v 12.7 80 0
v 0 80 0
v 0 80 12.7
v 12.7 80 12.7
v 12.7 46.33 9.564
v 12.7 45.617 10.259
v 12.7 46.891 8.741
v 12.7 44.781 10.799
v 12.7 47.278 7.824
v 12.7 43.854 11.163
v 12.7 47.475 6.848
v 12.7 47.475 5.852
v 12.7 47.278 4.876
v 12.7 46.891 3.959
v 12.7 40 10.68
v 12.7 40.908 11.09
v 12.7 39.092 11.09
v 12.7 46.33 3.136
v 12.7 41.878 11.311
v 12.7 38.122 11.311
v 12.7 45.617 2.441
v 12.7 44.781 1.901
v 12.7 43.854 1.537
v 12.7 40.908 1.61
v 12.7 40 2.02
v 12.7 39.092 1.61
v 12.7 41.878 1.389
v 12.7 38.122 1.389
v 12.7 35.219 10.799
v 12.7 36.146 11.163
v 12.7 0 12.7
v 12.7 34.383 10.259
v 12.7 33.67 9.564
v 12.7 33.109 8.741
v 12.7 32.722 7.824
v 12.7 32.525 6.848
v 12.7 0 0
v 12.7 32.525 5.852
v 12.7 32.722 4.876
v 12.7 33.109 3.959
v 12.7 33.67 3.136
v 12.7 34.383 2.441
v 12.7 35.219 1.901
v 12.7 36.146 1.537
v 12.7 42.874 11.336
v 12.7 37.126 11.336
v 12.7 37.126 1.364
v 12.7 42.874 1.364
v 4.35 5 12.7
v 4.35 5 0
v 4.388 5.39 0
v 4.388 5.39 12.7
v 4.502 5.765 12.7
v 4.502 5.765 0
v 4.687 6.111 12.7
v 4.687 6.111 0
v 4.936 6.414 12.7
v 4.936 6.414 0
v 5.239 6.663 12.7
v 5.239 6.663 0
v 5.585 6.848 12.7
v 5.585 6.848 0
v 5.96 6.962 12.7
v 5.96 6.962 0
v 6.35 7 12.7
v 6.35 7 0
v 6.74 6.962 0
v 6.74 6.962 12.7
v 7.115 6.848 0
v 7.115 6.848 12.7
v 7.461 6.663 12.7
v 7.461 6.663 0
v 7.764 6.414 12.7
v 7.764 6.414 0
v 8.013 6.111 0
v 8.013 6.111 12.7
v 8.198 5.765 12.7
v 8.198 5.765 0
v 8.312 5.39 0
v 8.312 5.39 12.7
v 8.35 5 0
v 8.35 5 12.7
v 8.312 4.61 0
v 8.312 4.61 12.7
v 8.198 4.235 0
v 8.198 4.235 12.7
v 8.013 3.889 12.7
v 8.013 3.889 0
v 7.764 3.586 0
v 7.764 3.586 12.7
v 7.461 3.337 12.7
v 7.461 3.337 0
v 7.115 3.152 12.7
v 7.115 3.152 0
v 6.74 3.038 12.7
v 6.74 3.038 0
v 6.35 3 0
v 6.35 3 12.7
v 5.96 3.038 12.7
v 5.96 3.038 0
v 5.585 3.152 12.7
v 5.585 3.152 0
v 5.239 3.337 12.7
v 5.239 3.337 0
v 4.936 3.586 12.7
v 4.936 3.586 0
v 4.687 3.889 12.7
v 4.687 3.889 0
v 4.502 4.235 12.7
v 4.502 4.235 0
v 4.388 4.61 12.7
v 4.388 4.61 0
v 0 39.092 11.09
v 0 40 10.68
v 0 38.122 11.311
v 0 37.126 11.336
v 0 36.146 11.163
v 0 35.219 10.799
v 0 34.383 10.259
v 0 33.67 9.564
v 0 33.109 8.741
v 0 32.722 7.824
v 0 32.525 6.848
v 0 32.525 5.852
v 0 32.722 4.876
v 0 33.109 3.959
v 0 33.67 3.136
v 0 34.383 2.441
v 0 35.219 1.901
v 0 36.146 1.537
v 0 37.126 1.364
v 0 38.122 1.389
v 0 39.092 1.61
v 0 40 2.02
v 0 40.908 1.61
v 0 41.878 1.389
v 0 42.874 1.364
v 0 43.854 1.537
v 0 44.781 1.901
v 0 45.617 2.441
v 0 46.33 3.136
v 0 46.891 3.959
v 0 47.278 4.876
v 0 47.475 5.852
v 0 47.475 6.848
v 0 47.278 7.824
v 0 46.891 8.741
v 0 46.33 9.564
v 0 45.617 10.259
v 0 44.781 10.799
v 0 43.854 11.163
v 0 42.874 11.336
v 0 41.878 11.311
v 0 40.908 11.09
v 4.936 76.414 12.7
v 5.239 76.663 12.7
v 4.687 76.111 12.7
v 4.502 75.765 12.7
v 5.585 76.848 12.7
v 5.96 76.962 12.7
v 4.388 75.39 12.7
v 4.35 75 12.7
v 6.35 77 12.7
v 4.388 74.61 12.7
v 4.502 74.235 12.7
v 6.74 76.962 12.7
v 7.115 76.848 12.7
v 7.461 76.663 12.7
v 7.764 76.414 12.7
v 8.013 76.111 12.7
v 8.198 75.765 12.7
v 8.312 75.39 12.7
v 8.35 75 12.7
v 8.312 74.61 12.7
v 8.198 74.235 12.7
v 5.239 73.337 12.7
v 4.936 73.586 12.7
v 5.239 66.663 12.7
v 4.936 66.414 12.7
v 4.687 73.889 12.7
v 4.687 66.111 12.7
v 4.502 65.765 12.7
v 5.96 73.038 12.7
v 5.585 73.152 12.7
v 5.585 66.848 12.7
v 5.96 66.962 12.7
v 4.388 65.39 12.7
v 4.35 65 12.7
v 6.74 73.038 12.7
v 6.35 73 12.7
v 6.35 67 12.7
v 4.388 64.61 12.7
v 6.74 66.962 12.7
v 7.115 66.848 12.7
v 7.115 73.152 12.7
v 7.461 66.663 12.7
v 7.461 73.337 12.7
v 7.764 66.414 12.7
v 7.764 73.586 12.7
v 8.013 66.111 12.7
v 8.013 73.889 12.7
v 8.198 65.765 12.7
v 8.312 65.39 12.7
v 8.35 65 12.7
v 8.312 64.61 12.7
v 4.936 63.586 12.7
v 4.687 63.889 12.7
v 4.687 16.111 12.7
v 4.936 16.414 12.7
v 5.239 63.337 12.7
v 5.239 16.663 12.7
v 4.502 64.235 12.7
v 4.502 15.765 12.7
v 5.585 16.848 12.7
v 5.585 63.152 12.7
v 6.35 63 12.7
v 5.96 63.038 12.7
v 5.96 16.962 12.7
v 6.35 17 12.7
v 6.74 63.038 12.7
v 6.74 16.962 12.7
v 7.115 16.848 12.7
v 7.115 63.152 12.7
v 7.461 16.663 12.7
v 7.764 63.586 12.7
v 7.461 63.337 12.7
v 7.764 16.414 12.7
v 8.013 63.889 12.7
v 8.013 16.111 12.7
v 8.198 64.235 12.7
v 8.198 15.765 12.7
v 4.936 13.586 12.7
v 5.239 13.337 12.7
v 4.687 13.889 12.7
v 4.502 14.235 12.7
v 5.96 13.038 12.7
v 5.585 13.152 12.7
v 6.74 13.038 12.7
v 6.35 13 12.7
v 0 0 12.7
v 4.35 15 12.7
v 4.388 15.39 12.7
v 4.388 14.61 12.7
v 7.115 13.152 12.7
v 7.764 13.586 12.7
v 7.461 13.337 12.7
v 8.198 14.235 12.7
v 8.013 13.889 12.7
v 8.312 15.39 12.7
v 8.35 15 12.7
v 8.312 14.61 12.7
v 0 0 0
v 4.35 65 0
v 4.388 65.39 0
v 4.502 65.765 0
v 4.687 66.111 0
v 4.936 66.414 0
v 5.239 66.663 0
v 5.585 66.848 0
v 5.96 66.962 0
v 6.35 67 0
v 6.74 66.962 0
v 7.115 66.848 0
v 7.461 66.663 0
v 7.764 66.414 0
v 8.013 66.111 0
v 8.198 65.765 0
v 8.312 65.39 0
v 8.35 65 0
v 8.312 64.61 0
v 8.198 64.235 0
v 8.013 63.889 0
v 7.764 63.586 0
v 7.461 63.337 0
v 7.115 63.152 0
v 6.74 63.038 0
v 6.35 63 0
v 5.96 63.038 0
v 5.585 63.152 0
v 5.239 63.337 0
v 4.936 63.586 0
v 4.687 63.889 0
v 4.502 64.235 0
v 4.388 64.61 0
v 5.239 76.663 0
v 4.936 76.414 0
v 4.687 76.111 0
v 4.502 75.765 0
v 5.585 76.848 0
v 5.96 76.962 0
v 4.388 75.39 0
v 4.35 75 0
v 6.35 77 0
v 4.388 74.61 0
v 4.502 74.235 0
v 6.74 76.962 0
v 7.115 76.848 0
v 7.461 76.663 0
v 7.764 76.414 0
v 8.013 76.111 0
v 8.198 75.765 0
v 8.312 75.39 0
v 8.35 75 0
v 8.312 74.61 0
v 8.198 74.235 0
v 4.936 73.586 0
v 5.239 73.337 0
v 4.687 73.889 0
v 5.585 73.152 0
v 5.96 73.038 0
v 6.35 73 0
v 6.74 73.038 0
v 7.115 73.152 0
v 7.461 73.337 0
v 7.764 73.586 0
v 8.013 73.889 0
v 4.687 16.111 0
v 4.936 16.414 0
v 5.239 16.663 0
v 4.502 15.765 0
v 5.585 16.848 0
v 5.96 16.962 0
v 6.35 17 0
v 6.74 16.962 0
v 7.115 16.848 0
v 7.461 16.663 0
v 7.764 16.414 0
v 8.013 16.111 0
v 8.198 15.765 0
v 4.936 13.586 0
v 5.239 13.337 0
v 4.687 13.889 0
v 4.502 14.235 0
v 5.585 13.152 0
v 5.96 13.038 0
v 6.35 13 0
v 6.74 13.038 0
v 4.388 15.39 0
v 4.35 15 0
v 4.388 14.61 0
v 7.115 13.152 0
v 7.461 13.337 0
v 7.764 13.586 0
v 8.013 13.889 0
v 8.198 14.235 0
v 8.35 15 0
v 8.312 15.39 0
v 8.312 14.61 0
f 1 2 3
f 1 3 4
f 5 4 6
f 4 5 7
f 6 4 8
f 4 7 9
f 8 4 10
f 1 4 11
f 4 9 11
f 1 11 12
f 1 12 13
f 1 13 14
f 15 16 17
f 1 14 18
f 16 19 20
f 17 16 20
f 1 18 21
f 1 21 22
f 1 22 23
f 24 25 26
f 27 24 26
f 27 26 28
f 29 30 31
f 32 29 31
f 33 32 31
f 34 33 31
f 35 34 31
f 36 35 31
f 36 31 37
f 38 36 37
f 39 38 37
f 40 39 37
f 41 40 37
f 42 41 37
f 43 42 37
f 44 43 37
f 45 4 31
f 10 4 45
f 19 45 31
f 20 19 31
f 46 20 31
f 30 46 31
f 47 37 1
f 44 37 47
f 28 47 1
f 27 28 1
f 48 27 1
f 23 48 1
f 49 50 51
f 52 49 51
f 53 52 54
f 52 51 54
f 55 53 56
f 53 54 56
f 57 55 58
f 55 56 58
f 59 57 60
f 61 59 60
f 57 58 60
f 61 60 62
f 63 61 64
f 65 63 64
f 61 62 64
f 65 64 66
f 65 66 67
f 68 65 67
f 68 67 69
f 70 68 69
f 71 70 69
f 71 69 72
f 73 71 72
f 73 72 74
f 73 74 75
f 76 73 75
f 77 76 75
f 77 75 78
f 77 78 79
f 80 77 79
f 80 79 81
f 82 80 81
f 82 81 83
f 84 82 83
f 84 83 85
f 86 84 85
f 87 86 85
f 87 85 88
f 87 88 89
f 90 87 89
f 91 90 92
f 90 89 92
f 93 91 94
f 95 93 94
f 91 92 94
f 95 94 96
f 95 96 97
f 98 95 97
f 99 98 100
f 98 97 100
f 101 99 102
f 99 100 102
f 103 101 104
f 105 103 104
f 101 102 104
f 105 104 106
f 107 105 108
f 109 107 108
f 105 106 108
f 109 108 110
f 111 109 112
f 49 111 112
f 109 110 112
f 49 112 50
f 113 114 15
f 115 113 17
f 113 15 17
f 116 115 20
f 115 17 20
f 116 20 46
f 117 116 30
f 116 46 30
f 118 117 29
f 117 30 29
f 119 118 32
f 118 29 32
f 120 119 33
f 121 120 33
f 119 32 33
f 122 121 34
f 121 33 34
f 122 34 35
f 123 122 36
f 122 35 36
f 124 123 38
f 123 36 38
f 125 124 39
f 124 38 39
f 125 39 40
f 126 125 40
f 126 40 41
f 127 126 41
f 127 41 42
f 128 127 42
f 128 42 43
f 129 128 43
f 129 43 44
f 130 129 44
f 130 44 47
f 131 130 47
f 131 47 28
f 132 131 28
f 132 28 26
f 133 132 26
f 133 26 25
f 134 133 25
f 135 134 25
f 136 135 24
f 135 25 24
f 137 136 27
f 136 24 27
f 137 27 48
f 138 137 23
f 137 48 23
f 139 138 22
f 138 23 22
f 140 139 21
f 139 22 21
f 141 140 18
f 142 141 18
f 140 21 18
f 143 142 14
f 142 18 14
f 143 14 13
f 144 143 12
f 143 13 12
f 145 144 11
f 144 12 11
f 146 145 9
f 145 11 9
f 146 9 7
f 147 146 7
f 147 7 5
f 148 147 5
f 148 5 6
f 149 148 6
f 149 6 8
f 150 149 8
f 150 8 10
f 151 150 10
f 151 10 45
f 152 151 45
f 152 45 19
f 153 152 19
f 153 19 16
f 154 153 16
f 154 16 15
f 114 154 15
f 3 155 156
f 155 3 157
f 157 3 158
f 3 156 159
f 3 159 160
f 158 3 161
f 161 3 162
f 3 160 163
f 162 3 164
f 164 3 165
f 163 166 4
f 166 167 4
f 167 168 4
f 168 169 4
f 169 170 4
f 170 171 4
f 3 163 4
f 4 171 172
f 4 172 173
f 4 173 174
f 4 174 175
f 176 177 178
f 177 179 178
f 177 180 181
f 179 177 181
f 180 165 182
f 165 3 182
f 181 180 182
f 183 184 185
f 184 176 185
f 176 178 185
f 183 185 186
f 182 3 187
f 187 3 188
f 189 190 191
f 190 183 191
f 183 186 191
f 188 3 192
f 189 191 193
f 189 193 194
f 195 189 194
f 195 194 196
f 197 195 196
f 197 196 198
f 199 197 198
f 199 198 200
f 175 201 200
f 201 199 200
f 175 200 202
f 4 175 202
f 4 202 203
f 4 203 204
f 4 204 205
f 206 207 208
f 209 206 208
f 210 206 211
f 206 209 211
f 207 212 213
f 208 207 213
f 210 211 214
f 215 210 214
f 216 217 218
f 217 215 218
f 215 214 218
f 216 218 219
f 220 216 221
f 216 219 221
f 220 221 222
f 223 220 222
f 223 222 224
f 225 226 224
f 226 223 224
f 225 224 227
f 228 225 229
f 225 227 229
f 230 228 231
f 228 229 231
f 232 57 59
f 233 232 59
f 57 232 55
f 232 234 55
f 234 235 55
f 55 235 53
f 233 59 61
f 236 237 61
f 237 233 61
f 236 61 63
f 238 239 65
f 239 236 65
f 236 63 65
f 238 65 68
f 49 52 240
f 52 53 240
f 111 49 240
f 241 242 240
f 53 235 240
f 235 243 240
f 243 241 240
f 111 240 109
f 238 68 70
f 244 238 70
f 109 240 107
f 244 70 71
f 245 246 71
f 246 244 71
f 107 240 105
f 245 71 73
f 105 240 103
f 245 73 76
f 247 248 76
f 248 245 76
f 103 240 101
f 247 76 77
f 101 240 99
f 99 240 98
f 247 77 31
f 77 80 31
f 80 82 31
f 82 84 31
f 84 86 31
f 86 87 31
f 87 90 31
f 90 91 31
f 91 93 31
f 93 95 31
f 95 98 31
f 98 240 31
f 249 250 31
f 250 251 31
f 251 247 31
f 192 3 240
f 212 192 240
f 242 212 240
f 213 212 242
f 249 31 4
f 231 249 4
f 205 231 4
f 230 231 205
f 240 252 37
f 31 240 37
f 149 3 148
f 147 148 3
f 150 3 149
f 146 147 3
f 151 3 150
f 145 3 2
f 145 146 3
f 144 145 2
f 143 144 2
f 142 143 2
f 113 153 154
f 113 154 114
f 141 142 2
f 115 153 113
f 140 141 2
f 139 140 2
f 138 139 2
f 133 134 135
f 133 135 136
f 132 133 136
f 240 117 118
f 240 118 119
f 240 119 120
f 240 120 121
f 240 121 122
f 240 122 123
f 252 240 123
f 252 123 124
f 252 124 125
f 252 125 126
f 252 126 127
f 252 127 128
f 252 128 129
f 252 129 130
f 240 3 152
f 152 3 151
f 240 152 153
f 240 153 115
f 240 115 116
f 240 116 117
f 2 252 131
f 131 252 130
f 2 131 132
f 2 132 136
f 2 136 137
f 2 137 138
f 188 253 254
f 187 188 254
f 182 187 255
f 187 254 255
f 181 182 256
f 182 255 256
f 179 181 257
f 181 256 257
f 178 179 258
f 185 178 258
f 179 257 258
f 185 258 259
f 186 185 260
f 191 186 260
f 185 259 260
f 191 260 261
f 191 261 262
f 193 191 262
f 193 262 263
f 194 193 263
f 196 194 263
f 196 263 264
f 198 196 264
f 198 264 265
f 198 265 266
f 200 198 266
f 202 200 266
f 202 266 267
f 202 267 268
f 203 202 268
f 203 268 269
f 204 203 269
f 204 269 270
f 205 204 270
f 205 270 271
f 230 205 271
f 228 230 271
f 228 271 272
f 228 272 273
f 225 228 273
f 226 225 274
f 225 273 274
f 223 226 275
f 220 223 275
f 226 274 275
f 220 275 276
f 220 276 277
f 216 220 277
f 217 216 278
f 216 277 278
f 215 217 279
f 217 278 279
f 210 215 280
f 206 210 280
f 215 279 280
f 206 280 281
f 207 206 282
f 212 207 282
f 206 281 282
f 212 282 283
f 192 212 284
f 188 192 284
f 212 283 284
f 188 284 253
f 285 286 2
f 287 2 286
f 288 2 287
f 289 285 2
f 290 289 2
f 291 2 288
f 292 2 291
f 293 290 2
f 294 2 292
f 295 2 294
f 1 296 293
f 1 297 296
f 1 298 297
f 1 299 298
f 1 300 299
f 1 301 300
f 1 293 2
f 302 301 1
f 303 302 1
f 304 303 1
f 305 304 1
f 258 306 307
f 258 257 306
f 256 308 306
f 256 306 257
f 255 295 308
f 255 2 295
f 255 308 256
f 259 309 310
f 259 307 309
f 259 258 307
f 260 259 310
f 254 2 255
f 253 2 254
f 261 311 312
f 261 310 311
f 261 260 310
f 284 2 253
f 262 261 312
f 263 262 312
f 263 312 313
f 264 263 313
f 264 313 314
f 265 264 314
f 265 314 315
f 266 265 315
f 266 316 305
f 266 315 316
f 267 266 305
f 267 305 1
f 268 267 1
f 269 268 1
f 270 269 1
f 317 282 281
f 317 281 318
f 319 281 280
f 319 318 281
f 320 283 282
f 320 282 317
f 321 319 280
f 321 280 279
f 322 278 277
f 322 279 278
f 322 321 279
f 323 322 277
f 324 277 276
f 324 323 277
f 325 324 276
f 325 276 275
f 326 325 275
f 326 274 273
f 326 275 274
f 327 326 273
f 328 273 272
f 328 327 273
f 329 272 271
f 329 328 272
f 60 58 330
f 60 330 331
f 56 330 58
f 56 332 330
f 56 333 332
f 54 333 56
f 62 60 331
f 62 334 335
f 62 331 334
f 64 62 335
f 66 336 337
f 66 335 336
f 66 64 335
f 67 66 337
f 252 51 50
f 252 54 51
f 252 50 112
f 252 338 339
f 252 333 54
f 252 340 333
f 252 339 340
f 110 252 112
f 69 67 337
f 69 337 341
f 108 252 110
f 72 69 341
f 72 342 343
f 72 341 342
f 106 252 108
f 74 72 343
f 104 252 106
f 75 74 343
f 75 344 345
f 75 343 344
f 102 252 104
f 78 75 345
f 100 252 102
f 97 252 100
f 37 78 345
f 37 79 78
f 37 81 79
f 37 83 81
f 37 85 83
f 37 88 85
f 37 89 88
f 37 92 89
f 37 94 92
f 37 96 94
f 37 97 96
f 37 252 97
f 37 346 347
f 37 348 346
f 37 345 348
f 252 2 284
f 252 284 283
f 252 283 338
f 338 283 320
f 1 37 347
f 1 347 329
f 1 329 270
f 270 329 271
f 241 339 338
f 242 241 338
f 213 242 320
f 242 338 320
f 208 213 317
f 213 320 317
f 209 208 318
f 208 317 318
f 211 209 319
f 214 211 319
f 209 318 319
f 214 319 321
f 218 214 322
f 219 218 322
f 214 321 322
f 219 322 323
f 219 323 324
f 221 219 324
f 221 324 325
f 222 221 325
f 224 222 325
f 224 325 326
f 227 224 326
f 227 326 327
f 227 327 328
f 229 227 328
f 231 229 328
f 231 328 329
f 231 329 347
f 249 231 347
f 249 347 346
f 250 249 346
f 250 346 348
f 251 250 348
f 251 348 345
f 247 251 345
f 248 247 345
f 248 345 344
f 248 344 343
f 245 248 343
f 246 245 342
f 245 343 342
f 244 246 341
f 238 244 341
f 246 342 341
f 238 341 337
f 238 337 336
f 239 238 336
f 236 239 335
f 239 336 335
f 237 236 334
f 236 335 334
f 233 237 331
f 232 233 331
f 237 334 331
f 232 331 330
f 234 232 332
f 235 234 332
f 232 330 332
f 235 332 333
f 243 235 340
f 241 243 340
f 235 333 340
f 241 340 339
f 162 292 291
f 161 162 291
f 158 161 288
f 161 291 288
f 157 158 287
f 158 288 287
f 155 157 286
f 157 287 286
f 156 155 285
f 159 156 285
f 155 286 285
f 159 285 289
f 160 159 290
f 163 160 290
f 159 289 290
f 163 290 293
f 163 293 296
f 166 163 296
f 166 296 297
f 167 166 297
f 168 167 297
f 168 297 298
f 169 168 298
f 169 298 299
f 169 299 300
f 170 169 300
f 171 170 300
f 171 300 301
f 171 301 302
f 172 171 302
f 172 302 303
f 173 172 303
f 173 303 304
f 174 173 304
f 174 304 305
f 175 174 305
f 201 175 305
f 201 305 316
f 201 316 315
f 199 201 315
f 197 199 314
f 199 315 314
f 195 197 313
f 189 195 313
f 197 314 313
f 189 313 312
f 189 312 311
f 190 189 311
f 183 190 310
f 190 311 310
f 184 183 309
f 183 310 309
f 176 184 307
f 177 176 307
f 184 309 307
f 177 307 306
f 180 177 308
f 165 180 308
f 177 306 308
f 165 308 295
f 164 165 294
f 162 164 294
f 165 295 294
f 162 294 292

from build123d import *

# Parameters (mm, degrees)
SKETCH1_W           = 12.7
SKETCH1_H           = 12.7
BOSS_EXTRUDE1_DEPTH = 80
CUT_EXTRUDE1_DEPTH  = 80
SKETCH3_R           = 2
CUT_EXTRUDE2_DEPTH  = 80


with BuildPart() as part:
    # Sketch1 → Boss-Extrude1 (new body)
    with BuildSketch(Plane(origin=(0, 0, 0), x_dir=(1, 0, 0), z_dir=(0, 1, 0))):
        with Locations((6.35, -6.35)):
            Rectangle(SKETCH1_W, SKETCH1_H)
    extrude(amount=BOSS_EXTRUDE1_DEPTH)

    # Sketch2 → Cut-Extrude1 (cut)
    with BuildSketch(Plane(origin=(12.7, 0, 0), x_dir=(0, 0, -1), z_dir=(1, 0, 0))):
        with BuildLine():
            ThreePointArc((-10.680127019, 40), (-6.35, 32.5), (-2.019872981, 40))
            ThreePointArc((-2.019872981, 40), (-6.35, 47.5), (-10.680127019, 40))
        make_face()
    extrude(amount=-CUT_EXTRUDE1_DEPTH, mode=Mode.SUBTRACT)

    # Sketch3 → Cut-Extrude2 (cut)
    with BuildSketch(Plane(origin=(0, 0, 0), x_dir=(-1, 0, 0), z_dir=(0, 0, -1))):
        with Locations((-6.35, 5)):
            Circle(SKETCH3_R)
        with Locations((-6.35, 15)):
            Circle(SKETCH3_R)
        with Locations((-6.35, 75)):
            Circle(SKETCH3_R)
        with Locations((-6.35, 65)):
            Circle(SKETCH3_R)
    extrude(amount=-CUT_EXTRUDE2_DEPTH, mode=Mode.SUBTRACT)


solid = part.part
